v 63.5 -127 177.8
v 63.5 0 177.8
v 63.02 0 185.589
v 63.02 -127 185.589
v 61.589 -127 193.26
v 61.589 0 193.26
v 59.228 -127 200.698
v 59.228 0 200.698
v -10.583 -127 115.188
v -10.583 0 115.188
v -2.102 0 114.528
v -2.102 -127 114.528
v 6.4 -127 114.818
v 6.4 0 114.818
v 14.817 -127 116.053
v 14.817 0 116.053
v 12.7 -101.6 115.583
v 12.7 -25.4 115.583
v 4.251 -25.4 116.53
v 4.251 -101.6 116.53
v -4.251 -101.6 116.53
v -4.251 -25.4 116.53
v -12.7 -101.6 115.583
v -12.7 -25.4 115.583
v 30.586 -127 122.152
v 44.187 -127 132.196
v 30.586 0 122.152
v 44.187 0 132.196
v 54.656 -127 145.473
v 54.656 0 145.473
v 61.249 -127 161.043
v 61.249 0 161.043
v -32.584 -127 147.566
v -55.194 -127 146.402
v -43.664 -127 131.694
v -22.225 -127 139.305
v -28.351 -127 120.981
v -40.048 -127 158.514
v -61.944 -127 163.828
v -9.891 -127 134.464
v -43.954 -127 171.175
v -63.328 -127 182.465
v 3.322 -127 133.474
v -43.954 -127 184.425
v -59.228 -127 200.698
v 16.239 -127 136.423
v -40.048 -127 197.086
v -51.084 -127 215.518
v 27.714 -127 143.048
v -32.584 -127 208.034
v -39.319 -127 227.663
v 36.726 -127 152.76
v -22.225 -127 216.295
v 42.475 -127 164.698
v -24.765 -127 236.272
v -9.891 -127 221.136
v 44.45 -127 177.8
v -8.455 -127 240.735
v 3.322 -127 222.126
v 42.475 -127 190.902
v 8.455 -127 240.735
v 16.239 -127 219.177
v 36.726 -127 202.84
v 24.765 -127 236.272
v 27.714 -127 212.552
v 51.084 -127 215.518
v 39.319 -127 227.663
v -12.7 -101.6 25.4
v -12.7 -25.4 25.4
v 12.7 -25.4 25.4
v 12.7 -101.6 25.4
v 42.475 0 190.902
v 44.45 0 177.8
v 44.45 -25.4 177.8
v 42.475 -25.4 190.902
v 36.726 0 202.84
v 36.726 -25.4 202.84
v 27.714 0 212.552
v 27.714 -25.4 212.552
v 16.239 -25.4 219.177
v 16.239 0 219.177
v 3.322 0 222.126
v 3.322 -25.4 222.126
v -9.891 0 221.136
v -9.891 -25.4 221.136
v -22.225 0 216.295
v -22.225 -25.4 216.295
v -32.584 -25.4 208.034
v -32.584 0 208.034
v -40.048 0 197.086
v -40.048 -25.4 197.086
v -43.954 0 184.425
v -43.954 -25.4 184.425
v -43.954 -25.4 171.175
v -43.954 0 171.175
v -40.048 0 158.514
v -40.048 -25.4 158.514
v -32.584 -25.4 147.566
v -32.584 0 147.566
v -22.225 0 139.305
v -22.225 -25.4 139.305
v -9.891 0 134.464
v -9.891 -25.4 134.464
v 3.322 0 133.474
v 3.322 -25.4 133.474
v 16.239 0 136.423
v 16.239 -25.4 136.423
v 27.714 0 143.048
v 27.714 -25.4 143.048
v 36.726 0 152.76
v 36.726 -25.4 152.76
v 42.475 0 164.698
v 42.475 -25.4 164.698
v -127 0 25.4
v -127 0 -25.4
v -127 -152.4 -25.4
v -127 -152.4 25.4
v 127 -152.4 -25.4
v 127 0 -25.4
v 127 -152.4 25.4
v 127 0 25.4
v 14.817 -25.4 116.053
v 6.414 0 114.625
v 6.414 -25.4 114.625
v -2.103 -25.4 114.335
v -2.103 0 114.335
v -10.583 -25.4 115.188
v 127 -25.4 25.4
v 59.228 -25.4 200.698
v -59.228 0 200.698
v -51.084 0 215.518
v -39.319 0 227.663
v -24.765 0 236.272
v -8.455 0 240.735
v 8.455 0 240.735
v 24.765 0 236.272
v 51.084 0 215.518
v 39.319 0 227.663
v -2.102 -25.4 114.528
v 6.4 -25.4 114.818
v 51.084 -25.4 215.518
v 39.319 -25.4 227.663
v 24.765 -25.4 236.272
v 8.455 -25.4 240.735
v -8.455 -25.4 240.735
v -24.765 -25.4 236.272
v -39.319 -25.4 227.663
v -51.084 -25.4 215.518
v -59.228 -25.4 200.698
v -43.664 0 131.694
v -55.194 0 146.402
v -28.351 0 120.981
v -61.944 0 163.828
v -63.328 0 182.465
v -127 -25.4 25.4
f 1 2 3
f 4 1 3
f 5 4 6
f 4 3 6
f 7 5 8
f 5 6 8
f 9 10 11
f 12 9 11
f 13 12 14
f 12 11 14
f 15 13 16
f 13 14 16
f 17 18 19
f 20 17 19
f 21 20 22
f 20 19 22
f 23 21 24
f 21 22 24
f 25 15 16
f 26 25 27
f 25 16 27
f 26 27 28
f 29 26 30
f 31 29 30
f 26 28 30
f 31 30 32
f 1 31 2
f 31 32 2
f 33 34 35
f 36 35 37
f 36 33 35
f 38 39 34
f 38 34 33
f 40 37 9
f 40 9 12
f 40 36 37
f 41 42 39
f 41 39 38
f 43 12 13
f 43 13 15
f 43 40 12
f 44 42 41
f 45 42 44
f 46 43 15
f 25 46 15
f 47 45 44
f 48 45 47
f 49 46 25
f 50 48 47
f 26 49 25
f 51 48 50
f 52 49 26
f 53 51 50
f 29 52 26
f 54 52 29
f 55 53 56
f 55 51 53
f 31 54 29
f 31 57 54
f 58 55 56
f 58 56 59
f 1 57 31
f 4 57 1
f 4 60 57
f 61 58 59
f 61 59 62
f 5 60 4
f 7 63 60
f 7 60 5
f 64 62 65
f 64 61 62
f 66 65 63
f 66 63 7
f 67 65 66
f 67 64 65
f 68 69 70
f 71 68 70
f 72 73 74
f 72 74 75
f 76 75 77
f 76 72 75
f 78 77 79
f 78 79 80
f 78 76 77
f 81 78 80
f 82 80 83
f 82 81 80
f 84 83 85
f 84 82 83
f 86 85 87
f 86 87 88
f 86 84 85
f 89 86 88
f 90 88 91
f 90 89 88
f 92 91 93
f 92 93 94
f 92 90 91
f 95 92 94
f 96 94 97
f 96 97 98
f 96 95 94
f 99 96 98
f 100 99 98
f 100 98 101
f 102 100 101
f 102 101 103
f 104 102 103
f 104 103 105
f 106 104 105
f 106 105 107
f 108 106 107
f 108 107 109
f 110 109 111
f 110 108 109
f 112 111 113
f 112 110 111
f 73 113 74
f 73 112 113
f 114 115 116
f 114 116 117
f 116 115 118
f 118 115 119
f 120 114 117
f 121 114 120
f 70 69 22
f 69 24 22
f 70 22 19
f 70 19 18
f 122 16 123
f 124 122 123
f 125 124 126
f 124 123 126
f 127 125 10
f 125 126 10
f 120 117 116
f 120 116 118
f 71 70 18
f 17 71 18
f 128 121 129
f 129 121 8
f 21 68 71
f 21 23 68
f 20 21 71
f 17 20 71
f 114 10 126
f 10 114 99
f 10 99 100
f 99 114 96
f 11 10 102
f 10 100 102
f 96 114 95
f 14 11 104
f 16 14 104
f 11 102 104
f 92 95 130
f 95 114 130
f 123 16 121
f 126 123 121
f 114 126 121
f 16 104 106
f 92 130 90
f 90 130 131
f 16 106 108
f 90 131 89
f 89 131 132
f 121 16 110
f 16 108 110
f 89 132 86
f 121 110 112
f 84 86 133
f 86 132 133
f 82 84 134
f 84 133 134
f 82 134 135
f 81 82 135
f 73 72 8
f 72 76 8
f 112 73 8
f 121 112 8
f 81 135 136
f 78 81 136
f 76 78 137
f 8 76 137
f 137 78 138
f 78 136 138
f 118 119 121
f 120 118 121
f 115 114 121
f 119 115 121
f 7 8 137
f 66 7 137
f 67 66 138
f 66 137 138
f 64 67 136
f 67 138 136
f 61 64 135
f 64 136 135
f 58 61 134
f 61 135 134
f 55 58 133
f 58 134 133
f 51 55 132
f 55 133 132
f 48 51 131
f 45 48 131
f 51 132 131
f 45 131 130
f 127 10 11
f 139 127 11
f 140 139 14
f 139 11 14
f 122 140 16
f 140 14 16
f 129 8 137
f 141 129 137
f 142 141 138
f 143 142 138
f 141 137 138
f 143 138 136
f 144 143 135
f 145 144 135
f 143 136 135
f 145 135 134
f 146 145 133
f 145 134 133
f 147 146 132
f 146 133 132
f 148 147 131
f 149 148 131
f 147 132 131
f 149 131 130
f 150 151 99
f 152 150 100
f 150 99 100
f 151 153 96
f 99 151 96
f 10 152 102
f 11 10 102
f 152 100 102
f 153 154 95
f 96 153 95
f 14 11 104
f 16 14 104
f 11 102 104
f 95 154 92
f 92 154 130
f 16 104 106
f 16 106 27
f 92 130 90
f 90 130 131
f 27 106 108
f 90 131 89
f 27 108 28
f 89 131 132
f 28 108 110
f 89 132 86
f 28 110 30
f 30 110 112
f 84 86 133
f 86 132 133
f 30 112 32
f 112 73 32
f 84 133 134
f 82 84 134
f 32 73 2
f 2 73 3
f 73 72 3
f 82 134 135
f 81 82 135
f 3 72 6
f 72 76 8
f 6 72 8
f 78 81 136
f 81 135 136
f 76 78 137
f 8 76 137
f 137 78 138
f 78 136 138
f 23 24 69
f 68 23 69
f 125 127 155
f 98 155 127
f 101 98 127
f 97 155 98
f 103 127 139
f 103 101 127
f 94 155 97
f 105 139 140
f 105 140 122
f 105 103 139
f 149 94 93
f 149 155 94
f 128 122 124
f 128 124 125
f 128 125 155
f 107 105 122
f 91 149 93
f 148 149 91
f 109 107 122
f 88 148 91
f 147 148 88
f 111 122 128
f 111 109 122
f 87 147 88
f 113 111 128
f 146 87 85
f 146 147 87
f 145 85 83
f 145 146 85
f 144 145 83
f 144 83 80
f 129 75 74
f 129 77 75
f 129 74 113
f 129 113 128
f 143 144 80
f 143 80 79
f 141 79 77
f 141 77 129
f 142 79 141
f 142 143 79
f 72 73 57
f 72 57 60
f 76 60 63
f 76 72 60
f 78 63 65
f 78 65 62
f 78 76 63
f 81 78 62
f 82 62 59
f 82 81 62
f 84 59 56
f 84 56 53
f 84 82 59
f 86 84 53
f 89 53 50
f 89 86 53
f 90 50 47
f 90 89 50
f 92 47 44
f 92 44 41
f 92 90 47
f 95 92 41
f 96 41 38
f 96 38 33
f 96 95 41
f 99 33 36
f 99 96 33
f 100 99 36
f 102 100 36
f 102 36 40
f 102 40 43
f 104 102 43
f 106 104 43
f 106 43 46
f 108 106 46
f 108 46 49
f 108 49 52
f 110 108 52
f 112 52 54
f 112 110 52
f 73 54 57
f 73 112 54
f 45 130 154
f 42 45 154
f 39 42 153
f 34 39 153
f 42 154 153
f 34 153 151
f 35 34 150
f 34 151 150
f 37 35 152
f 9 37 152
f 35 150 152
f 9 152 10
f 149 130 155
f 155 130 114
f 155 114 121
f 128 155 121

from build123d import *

# Parameters (mm, degrees)
F0_W     = 254
F0_H     = 50.8
F1_DEPTH = 152.4
F2_R     = 44.45
F3_DEPTH = 127
F4_DEPTH = 25.4
F6_DEPTH = 76.2


with BuildPart() as f1:
    # F0 (on Front) → F1 (new body)
    with BuildSketch(Plane.XZ):
        Rectangle(F0_W, F0_H)
    extrude(amount=F1_DEPTH)


with BuildPart() as f3:
    # F2 (on Front) → F3 (new body)
    with BuildSketch(Plane.XZ):
        with BuildLine():
            ThreePointArc((14.816667, 116.052803), (49.86536, 138.484662), (63.5, 177.8))
            ThreePointArc((63.5, 177.8), (62.4228, 189.446632), (59.227747, 200.698122))
            ThreePointArc((59.227747, 200.698122), (0, 241.3), (-59.227747, 200.698122))
            ThreePointArc((-59.227747, 200.698122), (-55.19407, 146.401518), (-10.583333, 115.188156))
            ThreePointArc((-10.583333, 115.188156), (2.152969, 114.554066), (14.816667, 116.052803))
        make_face()
        with Locations((0, 177.8)):
            Circle(F2_R, mode=Mode.SUBTRACT)
    extrude(amount=F3_DEPTH)


with BuildPart() as f4:
    # F2 (on Front) → F4 (new body)
    with BuildSketch(Plane.XZ):
        with BuildLine():
            ThreePointArc((14.816667, 116.052803), (49.86536, 138.484662), (63.5, 177.8))
            ThreePointArc((63.5, 177.8), (62.4228, 189.446632), (59.227747, 200.698122))
            ThreePointArc((59.227747, 200.698122), (0, 241.3), (-59.227747, 200.698122))
            ThreePointArc((-59.227747, 200.698122), (-55.19407, 146.401518), (-10.583333, 115.188156))
            ThreePointArc((-10.583333, 115.188156), (2.152969, 114.554066), (14.816667, 116.052803))
        make_face()
        with Locations((0, 177.8)):
            Circle(F2_R, mode=Mode.SUBTRACT)
        with BuildLine():
            ThreePointArc((59.227747, 200.698122), (62.4228, 189.446632), (63.5, 177.8))
            ThreePointArc((63.5, 177.8), (49.86536, 138.484662), (14.816667, 116.052803))
            Line((14.816667, 116.052803), (14.816667, 25.4))
            Line((14.816667, 25.4), (127, 25.4))
            Line((127, 25.4), (59.227747, 200.698122))
        make_face()
        with BuildLine():
            Line((14.816667, 25.4), (14.816667, 116.052803))
            ThreePointArc((14.816667, 116.052803), (2.160366, 114.33676), (-10.583333, 115.188156))
            Line((-10.583333, 115.188156), (-10.583333, 25.4))
            Line((-10.583333, 25.4), (14.816667, 25.4))
        make_face()
        with BuildLine():
            ThreePointArc((-10.583333, 115.188156), (-55.19407, 146.401518), (-59.227747, 200.698122))
            Line((-59.227747, 200.698122), (-127, 25.4))
            Line((-127, 25.4), (-10.583333, 25.4))
            Line((-10.583333, 25.4), (-10.583333, 115.188156))
        make_face()
    extrude(amount=F4_DEPTH)


with BuildPart() as f6:
    # F5 (on face) → F6 (new body)
    with BuildSketch(Plane.XZ.offset(25.4)):
        with BuildLine():
            Line((-12.7, 25.4), (12.7, 25.4))
            Line((12.7, 25.4), (12.7, 115.582961))
            ThreePointArc((12.7, 115.582961), (0, 116.648747), (-12.7, 115.582961))
            Line((-12.7, 115.582961), (-12.7, 25.4))
        make_face()
    extrude(amount=F6_DEPTH)


solid = Compound([f1.part, f3.part, f4.part, f6.part])
